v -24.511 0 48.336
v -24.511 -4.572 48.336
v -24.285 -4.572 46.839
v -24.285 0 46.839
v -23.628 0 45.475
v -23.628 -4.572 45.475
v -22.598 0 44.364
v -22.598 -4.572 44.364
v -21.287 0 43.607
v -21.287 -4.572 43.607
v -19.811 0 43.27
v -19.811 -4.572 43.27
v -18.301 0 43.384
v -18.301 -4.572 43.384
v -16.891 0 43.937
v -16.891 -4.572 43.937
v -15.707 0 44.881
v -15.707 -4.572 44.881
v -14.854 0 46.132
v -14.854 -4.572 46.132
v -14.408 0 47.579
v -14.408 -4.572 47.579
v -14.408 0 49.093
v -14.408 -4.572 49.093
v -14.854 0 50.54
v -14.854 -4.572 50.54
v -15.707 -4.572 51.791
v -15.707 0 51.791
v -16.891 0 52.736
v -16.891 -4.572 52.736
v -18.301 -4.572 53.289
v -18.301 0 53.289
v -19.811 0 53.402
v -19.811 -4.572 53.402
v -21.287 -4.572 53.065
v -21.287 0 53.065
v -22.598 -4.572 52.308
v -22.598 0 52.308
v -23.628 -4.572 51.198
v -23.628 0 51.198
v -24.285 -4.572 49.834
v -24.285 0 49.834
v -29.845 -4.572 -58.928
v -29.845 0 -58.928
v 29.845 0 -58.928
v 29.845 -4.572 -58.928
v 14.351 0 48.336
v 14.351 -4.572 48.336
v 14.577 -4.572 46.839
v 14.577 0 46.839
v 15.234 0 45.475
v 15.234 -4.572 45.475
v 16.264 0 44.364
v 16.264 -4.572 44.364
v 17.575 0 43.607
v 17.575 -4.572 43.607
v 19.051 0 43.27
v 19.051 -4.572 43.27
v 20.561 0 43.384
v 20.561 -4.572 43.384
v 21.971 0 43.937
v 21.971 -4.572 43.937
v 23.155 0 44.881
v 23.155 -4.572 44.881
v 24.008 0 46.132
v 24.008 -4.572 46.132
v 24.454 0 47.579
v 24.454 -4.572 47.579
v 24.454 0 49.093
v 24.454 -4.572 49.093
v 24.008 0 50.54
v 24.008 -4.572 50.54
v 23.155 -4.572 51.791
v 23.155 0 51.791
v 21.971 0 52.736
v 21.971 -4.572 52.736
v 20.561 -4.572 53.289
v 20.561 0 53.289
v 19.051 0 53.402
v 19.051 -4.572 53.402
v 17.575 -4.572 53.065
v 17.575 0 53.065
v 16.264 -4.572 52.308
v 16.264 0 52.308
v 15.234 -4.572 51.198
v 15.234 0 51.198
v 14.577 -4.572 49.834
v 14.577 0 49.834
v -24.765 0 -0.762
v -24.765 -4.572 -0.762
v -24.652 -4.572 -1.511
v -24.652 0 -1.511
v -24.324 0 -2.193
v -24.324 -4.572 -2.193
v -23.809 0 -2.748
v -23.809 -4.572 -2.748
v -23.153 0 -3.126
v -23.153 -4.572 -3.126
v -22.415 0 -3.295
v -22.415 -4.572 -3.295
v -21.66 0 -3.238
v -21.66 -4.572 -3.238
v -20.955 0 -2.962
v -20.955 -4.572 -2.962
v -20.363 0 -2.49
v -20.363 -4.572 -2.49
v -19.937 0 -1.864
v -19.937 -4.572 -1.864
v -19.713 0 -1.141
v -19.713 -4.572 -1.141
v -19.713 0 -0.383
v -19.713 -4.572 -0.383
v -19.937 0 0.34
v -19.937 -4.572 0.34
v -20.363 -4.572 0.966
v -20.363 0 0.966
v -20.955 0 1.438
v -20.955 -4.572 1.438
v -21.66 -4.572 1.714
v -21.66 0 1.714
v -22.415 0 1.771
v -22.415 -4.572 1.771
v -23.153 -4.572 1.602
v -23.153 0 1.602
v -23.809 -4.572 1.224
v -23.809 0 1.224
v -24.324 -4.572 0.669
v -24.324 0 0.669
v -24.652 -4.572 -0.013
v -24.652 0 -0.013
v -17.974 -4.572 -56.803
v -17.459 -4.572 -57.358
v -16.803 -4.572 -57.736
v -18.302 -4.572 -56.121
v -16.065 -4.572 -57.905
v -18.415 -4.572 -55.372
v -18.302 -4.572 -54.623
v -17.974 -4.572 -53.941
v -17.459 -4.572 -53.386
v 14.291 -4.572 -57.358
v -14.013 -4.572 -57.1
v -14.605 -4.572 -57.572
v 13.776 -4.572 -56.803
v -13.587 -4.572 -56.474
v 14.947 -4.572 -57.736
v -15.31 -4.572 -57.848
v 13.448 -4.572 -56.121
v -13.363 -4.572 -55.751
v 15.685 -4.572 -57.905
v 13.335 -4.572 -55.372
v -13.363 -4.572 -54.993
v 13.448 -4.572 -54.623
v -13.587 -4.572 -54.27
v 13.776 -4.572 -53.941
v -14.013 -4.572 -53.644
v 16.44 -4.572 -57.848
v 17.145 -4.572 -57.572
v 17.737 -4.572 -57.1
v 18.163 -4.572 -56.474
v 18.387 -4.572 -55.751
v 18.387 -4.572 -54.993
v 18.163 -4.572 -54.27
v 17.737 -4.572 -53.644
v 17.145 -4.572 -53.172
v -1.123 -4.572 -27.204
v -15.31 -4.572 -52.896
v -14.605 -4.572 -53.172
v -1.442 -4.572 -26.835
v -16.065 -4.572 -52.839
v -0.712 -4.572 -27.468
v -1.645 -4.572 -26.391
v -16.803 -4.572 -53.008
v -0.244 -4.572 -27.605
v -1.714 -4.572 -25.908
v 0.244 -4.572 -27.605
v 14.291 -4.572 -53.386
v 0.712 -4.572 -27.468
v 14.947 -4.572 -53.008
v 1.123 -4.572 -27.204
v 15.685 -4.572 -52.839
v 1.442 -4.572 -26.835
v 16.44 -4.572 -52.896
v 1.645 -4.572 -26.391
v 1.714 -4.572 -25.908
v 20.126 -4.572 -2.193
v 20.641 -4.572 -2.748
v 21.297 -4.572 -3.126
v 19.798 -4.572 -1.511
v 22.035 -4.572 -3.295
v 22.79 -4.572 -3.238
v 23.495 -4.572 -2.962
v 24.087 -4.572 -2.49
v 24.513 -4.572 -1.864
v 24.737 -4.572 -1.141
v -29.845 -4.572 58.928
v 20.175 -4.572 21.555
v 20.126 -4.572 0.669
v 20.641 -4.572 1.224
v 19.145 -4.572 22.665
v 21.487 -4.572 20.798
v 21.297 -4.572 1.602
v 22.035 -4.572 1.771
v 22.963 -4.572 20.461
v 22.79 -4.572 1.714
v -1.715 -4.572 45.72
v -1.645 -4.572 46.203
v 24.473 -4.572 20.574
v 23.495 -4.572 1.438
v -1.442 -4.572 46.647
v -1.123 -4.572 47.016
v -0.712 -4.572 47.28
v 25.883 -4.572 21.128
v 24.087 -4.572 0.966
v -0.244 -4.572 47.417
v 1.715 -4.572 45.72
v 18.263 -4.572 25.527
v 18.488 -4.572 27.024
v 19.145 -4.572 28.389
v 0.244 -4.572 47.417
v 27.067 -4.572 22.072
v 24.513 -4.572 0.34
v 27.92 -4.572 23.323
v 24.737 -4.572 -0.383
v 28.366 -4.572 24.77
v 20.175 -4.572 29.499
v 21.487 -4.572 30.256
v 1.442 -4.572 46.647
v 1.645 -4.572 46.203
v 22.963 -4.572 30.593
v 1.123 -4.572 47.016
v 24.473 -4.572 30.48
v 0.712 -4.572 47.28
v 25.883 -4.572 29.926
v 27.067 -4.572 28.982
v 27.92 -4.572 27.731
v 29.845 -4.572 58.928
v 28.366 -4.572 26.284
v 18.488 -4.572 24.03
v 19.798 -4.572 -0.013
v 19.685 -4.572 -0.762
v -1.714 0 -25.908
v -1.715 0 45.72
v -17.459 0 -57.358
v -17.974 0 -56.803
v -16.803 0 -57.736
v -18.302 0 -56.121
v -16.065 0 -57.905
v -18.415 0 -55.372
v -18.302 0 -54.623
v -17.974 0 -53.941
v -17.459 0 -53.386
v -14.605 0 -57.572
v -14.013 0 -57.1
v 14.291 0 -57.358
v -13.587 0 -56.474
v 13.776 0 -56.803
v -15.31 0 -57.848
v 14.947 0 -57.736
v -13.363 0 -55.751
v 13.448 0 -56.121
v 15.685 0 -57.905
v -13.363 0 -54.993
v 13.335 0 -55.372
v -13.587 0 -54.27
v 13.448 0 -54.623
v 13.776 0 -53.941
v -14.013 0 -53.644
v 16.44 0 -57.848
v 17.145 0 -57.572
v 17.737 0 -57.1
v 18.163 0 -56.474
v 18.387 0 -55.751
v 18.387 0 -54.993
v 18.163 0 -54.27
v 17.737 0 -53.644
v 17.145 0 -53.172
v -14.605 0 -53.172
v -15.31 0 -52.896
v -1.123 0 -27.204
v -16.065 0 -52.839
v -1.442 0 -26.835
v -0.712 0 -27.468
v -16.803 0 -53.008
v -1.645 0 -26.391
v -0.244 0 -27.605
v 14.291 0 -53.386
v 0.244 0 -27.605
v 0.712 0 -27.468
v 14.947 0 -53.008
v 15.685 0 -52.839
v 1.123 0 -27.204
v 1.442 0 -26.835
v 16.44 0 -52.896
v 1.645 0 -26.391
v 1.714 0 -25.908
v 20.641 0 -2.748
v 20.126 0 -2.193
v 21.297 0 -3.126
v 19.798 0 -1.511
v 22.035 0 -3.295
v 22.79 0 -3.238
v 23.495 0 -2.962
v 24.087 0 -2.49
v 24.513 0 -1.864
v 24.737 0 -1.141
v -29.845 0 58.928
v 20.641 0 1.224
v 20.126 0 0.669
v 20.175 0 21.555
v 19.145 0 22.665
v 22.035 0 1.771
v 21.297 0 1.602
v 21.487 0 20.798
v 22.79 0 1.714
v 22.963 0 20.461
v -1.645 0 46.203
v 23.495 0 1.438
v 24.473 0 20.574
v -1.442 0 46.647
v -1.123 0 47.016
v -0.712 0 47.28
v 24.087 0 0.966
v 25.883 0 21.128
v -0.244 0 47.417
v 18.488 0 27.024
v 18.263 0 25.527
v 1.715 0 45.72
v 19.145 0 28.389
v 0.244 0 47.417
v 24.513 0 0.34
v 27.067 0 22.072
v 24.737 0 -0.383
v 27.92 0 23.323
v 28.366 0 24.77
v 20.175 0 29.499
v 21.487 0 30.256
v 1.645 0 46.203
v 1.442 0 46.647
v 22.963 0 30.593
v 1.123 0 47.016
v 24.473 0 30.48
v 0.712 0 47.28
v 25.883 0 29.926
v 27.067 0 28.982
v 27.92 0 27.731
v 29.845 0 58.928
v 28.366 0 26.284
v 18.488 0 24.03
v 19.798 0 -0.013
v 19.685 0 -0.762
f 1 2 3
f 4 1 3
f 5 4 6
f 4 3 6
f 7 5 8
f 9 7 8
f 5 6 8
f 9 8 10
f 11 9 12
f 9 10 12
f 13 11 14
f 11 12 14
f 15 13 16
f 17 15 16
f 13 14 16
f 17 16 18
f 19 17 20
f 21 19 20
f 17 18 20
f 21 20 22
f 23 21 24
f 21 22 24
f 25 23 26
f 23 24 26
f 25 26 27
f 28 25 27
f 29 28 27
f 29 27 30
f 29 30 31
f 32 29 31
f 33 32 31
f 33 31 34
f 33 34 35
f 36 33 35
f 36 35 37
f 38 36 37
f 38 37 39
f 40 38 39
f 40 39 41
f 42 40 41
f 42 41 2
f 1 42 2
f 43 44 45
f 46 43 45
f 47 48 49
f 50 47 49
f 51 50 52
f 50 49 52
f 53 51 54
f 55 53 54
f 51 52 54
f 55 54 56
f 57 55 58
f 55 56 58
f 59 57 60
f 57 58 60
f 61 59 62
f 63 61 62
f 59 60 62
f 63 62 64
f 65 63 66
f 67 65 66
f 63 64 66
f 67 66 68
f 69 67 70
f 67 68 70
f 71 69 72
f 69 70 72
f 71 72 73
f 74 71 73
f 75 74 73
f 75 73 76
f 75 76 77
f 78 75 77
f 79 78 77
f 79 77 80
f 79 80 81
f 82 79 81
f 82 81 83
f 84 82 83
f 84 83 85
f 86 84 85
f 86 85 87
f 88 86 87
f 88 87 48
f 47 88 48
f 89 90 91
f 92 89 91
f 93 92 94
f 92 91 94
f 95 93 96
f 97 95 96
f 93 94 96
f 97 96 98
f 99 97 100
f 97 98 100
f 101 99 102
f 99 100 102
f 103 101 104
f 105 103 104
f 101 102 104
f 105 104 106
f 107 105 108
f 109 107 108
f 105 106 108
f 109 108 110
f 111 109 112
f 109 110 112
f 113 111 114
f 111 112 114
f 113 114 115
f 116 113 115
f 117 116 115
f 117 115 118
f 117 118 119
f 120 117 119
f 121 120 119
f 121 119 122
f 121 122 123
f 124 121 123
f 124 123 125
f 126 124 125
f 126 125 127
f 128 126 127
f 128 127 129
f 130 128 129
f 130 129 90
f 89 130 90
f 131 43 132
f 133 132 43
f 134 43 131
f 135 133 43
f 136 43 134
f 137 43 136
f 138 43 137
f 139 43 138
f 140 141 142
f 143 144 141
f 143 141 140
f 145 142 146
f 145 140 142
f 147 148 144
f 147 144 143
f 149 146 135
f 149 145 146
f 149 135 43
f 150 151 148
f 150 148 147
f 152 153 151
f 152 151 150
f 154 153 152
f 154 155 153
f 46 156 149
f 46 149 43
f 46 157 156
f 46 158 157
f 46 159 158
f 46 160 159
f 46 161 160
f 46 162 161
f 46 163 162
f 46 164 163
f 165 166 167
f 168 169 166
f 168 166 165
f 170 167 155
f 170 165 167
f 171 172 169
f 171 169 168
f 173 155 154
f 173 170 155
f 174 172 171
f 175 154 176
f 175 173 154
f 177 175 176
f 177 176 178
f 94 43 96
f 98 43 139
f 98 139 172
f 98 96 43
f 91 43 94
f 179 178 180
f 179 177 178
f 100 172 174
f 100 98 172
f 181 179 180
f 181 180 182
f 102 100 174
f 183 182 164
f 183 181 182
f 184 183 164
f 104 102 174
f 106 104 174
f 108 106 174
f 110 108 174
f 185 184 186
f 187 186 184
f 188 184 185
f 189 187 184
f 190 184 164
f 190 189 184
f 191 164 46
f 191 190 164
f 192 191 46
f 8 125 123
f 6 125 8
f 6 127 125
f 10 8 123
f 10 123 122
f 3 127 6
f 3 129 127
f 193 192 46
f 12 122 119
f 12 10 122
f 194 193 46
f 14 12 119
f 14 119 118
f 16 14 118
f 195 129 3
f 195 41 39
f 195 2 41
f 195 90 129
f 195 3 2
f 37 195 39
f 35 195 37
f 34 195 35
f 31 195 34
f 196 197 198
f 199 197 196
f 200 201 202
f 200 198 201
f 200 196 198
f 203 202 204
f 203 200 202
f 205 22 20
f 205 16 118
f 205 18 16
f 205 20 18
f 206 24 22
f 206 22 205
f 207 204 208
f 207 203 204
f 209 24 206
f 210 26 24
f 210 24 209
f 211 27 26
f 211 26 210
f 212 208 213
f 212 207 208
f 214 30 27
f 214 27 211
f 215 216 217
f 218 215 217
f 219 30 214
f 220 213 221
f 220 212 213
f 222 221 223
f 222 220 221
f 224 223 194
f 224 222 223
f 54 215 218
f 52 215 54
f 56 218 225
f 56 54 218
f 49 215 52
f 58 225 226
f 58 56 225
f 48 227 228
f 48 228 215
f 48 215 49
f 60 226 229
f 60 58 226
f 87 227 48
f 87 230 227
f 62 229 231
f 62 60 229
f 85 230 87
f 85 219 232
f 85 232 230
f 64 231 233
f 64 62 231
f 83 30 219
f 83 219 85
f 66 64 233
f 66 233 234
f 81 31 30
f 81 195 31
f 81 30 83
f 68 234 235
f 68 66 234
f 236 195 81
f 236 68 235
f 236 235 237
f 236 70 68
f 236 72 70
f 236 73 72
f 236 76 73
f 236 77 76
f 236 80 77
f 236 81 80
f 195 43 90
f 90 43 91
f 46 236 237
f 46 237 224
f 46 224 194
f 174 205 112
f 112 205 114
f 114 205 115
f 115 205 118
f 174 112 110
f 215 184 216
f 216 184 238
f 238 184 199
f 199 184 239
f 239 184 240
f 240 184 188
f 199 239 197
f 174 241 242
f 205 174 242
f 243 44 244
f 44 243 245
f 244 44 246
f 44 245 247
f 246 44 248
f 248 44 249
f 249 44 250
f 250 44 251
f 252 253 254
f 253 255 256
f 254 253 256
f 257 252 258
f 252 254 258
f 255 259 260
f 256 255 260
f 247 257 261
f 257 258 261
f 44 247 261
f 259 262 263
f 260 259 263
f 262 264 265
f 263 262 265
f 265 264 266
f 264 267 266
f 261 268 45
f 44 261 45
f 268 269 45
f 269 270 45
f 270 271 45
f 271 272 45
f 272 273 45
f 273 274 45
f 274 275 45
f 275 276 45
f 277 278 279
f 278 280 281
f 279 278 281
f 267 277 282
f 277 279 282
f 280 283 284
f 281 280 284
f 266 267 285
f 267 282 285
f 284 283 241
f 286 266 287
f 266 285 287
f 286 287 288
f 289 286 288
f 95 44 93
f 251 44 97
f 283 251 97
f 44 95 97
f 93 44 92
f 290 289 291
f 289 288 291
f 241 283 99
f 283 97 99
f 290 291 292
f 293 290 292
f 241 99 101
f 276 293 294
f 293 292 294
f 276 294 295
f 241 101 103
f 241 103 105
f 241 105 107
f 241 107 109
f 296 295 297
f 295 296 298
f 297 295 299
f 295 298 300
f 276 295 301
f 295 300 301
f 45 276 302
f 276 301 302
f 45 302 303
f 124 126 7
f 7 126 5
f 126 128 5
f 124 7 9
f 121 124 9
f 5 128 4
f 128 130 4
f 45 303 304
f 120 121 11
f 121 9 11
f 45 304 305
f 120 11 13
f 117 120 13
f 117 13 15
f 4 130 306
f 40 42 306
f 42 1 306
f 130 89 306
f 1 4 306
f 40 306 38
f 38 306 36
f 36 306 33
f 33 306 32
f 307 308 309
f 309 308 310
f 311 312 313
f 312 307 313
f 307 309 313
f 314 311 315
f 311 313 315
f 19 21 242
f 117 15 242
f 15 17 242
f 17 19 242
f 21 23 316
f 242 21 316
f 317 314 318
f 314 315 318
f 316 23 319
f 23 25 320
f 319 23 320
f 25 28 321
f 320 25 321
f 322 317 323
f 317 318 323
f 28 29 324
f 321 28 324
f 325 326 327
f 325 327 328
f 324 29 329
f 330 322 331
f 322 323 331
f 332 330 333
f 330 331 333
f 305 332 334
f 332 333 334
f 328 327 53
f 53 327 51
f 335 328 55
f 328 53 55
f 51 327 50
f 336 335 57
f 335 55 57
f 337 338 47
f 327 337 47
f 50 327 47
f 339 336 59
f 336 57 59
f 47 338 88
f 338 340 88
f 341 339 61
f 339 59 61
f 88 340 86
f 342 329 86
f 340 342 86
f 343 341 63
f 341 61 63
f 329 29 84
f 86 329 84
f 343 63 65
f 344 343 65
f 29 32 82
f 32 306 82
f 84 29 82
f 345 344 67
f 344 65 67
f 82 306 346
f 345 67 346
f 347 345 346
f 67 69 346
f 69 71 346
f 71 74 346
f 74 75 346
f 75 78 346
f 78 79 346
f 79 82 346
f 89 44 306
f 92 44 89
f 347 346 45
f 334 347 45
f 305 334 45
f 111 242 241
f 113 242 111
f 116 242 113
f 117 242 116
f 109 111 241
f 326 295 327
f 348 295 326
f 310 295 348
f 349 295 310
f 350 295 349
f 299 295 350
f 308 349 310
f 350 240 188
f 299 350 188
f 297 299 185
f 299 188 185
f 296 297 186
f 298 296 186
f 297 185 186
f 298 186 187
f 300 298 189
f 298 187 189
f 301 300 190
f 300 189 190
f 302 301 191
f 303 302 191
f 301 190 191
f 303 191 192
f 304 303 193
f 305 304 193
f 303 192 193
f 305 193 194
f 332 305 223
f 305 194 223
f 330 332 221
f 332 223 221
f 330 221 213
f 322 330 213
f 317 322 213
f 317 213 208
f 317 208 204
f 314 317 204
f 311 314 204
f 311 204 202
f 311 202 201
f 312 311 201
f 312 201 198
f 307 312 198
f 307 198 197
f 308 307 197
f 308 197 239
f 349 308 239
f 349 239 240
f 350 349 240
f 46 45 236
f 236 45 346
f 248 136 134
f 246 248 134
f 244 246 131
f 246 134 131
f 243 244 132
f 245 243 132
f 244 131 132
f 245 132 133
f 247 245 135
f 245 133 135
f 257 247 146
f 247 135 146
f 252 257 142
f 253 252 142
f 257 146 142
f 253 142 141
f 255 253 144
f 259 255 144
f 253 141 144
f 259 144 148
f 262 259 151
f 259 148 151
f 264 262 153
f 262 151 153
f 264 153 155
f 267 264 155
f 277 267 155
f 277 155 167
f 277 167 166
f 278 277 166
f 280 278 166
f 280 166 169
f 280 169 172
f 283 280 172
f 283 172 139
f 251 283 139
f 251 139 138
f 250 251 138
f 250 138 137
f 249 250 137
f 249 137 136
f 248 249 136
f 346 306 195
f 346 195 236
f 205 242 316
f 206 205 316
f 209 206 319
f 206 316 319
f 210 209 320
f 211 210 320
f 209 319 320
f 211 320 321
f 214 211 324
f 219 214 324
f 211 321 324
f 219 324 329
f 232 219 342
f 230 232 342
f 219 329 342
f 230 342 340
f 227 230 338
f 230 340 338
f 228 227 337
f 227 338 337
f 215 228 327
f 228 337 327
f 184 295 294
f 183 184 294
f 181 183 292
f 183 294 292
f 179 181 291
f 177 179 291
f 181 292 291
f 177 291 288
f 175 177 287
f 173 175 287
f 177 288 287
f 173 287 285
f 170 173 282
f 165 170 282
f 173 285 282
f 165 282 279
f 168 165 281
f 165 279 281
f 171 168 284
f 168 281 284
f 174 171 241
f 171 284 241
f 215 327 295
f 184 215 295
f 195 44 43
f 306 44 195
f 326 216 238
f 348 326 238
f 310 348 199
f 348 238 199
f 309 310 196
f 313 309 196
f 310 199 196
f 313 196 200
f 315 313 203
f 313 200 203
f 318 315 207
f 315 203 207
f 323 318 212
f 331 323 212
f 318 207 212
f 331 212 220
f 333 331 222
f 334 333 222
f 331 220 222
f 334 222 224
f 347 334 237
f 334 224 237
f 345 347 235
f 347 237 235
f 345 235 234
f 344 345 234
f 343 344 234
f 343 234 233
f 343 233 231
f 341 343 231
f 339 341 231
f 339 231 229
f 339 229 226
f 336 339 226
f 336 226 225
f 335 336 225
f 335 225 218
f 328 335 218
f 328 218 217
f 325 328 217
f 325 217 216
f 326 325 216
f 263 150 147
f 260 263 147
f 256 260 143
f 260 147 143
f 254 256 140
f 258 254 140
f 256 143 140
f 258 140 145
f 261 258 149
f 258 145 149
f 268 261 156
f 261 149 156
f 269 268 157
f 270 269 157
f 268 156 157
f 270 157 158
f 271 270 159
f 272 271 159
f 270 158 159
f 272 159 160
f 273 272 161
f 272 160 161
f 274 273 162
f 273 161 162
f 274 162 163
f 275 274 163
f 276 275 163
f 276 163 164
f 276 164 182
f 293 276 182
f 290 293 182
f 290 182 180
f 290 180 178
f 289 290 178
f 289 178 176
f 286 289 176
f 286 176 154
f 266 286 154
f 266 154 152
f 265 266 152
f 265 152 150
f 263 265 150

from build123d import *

# Parameters (mm, degrees)
F0_W     = 59.69
F0_H     = 117.856
F1_DEPTH = 4.572
F2_D     = 10.16
F3_D     = 5.08


with BuildPart() as f1:
    # F0 (on Front) → F1 (new body)
    with BuildSketch(Plane.XZ):
        Rectangle(F0_W, F0_H)
        with BuildLine():
            ThreePointArc((-1.7145, 45.72), (0, 47.4345), (1.7145, 45.72))
            Line((1.7145, 45.72), (1.7145, -25.908))
            ThreePointArc((1.7145, -25.908), (0, -27.6225), (-1.7145, -25.908))
            Line((-1.7145, -25.908), (-1.7145, 45.72))
        make_face(mode=Mode.SUBTRACT)
    extrude(amount=F1_DEPTH)

    # F2 (through all)
    with Locations(Plane(origin=(0, 0, 0), x_dir=(1, 0, 0), z_dir=(0, 1, 0))):
        with Locations((-19.431, -48.3362), (19.431, -48.3362), (23.3426, -25.527)):
            Hole(F2_D / 2)

    # F3 (through all)
    with Locations(Plane(origin=(0, 0, 0), x_dir=(1, 0, 0), z_dir=(0, 1, 0))):
        with Locations((-22.225, 0.762), (22.225, 0.762), (-15.875, 55.372), (15.875, 55.372)):
            Hole(F3_D / 2)


solid = f1.part
